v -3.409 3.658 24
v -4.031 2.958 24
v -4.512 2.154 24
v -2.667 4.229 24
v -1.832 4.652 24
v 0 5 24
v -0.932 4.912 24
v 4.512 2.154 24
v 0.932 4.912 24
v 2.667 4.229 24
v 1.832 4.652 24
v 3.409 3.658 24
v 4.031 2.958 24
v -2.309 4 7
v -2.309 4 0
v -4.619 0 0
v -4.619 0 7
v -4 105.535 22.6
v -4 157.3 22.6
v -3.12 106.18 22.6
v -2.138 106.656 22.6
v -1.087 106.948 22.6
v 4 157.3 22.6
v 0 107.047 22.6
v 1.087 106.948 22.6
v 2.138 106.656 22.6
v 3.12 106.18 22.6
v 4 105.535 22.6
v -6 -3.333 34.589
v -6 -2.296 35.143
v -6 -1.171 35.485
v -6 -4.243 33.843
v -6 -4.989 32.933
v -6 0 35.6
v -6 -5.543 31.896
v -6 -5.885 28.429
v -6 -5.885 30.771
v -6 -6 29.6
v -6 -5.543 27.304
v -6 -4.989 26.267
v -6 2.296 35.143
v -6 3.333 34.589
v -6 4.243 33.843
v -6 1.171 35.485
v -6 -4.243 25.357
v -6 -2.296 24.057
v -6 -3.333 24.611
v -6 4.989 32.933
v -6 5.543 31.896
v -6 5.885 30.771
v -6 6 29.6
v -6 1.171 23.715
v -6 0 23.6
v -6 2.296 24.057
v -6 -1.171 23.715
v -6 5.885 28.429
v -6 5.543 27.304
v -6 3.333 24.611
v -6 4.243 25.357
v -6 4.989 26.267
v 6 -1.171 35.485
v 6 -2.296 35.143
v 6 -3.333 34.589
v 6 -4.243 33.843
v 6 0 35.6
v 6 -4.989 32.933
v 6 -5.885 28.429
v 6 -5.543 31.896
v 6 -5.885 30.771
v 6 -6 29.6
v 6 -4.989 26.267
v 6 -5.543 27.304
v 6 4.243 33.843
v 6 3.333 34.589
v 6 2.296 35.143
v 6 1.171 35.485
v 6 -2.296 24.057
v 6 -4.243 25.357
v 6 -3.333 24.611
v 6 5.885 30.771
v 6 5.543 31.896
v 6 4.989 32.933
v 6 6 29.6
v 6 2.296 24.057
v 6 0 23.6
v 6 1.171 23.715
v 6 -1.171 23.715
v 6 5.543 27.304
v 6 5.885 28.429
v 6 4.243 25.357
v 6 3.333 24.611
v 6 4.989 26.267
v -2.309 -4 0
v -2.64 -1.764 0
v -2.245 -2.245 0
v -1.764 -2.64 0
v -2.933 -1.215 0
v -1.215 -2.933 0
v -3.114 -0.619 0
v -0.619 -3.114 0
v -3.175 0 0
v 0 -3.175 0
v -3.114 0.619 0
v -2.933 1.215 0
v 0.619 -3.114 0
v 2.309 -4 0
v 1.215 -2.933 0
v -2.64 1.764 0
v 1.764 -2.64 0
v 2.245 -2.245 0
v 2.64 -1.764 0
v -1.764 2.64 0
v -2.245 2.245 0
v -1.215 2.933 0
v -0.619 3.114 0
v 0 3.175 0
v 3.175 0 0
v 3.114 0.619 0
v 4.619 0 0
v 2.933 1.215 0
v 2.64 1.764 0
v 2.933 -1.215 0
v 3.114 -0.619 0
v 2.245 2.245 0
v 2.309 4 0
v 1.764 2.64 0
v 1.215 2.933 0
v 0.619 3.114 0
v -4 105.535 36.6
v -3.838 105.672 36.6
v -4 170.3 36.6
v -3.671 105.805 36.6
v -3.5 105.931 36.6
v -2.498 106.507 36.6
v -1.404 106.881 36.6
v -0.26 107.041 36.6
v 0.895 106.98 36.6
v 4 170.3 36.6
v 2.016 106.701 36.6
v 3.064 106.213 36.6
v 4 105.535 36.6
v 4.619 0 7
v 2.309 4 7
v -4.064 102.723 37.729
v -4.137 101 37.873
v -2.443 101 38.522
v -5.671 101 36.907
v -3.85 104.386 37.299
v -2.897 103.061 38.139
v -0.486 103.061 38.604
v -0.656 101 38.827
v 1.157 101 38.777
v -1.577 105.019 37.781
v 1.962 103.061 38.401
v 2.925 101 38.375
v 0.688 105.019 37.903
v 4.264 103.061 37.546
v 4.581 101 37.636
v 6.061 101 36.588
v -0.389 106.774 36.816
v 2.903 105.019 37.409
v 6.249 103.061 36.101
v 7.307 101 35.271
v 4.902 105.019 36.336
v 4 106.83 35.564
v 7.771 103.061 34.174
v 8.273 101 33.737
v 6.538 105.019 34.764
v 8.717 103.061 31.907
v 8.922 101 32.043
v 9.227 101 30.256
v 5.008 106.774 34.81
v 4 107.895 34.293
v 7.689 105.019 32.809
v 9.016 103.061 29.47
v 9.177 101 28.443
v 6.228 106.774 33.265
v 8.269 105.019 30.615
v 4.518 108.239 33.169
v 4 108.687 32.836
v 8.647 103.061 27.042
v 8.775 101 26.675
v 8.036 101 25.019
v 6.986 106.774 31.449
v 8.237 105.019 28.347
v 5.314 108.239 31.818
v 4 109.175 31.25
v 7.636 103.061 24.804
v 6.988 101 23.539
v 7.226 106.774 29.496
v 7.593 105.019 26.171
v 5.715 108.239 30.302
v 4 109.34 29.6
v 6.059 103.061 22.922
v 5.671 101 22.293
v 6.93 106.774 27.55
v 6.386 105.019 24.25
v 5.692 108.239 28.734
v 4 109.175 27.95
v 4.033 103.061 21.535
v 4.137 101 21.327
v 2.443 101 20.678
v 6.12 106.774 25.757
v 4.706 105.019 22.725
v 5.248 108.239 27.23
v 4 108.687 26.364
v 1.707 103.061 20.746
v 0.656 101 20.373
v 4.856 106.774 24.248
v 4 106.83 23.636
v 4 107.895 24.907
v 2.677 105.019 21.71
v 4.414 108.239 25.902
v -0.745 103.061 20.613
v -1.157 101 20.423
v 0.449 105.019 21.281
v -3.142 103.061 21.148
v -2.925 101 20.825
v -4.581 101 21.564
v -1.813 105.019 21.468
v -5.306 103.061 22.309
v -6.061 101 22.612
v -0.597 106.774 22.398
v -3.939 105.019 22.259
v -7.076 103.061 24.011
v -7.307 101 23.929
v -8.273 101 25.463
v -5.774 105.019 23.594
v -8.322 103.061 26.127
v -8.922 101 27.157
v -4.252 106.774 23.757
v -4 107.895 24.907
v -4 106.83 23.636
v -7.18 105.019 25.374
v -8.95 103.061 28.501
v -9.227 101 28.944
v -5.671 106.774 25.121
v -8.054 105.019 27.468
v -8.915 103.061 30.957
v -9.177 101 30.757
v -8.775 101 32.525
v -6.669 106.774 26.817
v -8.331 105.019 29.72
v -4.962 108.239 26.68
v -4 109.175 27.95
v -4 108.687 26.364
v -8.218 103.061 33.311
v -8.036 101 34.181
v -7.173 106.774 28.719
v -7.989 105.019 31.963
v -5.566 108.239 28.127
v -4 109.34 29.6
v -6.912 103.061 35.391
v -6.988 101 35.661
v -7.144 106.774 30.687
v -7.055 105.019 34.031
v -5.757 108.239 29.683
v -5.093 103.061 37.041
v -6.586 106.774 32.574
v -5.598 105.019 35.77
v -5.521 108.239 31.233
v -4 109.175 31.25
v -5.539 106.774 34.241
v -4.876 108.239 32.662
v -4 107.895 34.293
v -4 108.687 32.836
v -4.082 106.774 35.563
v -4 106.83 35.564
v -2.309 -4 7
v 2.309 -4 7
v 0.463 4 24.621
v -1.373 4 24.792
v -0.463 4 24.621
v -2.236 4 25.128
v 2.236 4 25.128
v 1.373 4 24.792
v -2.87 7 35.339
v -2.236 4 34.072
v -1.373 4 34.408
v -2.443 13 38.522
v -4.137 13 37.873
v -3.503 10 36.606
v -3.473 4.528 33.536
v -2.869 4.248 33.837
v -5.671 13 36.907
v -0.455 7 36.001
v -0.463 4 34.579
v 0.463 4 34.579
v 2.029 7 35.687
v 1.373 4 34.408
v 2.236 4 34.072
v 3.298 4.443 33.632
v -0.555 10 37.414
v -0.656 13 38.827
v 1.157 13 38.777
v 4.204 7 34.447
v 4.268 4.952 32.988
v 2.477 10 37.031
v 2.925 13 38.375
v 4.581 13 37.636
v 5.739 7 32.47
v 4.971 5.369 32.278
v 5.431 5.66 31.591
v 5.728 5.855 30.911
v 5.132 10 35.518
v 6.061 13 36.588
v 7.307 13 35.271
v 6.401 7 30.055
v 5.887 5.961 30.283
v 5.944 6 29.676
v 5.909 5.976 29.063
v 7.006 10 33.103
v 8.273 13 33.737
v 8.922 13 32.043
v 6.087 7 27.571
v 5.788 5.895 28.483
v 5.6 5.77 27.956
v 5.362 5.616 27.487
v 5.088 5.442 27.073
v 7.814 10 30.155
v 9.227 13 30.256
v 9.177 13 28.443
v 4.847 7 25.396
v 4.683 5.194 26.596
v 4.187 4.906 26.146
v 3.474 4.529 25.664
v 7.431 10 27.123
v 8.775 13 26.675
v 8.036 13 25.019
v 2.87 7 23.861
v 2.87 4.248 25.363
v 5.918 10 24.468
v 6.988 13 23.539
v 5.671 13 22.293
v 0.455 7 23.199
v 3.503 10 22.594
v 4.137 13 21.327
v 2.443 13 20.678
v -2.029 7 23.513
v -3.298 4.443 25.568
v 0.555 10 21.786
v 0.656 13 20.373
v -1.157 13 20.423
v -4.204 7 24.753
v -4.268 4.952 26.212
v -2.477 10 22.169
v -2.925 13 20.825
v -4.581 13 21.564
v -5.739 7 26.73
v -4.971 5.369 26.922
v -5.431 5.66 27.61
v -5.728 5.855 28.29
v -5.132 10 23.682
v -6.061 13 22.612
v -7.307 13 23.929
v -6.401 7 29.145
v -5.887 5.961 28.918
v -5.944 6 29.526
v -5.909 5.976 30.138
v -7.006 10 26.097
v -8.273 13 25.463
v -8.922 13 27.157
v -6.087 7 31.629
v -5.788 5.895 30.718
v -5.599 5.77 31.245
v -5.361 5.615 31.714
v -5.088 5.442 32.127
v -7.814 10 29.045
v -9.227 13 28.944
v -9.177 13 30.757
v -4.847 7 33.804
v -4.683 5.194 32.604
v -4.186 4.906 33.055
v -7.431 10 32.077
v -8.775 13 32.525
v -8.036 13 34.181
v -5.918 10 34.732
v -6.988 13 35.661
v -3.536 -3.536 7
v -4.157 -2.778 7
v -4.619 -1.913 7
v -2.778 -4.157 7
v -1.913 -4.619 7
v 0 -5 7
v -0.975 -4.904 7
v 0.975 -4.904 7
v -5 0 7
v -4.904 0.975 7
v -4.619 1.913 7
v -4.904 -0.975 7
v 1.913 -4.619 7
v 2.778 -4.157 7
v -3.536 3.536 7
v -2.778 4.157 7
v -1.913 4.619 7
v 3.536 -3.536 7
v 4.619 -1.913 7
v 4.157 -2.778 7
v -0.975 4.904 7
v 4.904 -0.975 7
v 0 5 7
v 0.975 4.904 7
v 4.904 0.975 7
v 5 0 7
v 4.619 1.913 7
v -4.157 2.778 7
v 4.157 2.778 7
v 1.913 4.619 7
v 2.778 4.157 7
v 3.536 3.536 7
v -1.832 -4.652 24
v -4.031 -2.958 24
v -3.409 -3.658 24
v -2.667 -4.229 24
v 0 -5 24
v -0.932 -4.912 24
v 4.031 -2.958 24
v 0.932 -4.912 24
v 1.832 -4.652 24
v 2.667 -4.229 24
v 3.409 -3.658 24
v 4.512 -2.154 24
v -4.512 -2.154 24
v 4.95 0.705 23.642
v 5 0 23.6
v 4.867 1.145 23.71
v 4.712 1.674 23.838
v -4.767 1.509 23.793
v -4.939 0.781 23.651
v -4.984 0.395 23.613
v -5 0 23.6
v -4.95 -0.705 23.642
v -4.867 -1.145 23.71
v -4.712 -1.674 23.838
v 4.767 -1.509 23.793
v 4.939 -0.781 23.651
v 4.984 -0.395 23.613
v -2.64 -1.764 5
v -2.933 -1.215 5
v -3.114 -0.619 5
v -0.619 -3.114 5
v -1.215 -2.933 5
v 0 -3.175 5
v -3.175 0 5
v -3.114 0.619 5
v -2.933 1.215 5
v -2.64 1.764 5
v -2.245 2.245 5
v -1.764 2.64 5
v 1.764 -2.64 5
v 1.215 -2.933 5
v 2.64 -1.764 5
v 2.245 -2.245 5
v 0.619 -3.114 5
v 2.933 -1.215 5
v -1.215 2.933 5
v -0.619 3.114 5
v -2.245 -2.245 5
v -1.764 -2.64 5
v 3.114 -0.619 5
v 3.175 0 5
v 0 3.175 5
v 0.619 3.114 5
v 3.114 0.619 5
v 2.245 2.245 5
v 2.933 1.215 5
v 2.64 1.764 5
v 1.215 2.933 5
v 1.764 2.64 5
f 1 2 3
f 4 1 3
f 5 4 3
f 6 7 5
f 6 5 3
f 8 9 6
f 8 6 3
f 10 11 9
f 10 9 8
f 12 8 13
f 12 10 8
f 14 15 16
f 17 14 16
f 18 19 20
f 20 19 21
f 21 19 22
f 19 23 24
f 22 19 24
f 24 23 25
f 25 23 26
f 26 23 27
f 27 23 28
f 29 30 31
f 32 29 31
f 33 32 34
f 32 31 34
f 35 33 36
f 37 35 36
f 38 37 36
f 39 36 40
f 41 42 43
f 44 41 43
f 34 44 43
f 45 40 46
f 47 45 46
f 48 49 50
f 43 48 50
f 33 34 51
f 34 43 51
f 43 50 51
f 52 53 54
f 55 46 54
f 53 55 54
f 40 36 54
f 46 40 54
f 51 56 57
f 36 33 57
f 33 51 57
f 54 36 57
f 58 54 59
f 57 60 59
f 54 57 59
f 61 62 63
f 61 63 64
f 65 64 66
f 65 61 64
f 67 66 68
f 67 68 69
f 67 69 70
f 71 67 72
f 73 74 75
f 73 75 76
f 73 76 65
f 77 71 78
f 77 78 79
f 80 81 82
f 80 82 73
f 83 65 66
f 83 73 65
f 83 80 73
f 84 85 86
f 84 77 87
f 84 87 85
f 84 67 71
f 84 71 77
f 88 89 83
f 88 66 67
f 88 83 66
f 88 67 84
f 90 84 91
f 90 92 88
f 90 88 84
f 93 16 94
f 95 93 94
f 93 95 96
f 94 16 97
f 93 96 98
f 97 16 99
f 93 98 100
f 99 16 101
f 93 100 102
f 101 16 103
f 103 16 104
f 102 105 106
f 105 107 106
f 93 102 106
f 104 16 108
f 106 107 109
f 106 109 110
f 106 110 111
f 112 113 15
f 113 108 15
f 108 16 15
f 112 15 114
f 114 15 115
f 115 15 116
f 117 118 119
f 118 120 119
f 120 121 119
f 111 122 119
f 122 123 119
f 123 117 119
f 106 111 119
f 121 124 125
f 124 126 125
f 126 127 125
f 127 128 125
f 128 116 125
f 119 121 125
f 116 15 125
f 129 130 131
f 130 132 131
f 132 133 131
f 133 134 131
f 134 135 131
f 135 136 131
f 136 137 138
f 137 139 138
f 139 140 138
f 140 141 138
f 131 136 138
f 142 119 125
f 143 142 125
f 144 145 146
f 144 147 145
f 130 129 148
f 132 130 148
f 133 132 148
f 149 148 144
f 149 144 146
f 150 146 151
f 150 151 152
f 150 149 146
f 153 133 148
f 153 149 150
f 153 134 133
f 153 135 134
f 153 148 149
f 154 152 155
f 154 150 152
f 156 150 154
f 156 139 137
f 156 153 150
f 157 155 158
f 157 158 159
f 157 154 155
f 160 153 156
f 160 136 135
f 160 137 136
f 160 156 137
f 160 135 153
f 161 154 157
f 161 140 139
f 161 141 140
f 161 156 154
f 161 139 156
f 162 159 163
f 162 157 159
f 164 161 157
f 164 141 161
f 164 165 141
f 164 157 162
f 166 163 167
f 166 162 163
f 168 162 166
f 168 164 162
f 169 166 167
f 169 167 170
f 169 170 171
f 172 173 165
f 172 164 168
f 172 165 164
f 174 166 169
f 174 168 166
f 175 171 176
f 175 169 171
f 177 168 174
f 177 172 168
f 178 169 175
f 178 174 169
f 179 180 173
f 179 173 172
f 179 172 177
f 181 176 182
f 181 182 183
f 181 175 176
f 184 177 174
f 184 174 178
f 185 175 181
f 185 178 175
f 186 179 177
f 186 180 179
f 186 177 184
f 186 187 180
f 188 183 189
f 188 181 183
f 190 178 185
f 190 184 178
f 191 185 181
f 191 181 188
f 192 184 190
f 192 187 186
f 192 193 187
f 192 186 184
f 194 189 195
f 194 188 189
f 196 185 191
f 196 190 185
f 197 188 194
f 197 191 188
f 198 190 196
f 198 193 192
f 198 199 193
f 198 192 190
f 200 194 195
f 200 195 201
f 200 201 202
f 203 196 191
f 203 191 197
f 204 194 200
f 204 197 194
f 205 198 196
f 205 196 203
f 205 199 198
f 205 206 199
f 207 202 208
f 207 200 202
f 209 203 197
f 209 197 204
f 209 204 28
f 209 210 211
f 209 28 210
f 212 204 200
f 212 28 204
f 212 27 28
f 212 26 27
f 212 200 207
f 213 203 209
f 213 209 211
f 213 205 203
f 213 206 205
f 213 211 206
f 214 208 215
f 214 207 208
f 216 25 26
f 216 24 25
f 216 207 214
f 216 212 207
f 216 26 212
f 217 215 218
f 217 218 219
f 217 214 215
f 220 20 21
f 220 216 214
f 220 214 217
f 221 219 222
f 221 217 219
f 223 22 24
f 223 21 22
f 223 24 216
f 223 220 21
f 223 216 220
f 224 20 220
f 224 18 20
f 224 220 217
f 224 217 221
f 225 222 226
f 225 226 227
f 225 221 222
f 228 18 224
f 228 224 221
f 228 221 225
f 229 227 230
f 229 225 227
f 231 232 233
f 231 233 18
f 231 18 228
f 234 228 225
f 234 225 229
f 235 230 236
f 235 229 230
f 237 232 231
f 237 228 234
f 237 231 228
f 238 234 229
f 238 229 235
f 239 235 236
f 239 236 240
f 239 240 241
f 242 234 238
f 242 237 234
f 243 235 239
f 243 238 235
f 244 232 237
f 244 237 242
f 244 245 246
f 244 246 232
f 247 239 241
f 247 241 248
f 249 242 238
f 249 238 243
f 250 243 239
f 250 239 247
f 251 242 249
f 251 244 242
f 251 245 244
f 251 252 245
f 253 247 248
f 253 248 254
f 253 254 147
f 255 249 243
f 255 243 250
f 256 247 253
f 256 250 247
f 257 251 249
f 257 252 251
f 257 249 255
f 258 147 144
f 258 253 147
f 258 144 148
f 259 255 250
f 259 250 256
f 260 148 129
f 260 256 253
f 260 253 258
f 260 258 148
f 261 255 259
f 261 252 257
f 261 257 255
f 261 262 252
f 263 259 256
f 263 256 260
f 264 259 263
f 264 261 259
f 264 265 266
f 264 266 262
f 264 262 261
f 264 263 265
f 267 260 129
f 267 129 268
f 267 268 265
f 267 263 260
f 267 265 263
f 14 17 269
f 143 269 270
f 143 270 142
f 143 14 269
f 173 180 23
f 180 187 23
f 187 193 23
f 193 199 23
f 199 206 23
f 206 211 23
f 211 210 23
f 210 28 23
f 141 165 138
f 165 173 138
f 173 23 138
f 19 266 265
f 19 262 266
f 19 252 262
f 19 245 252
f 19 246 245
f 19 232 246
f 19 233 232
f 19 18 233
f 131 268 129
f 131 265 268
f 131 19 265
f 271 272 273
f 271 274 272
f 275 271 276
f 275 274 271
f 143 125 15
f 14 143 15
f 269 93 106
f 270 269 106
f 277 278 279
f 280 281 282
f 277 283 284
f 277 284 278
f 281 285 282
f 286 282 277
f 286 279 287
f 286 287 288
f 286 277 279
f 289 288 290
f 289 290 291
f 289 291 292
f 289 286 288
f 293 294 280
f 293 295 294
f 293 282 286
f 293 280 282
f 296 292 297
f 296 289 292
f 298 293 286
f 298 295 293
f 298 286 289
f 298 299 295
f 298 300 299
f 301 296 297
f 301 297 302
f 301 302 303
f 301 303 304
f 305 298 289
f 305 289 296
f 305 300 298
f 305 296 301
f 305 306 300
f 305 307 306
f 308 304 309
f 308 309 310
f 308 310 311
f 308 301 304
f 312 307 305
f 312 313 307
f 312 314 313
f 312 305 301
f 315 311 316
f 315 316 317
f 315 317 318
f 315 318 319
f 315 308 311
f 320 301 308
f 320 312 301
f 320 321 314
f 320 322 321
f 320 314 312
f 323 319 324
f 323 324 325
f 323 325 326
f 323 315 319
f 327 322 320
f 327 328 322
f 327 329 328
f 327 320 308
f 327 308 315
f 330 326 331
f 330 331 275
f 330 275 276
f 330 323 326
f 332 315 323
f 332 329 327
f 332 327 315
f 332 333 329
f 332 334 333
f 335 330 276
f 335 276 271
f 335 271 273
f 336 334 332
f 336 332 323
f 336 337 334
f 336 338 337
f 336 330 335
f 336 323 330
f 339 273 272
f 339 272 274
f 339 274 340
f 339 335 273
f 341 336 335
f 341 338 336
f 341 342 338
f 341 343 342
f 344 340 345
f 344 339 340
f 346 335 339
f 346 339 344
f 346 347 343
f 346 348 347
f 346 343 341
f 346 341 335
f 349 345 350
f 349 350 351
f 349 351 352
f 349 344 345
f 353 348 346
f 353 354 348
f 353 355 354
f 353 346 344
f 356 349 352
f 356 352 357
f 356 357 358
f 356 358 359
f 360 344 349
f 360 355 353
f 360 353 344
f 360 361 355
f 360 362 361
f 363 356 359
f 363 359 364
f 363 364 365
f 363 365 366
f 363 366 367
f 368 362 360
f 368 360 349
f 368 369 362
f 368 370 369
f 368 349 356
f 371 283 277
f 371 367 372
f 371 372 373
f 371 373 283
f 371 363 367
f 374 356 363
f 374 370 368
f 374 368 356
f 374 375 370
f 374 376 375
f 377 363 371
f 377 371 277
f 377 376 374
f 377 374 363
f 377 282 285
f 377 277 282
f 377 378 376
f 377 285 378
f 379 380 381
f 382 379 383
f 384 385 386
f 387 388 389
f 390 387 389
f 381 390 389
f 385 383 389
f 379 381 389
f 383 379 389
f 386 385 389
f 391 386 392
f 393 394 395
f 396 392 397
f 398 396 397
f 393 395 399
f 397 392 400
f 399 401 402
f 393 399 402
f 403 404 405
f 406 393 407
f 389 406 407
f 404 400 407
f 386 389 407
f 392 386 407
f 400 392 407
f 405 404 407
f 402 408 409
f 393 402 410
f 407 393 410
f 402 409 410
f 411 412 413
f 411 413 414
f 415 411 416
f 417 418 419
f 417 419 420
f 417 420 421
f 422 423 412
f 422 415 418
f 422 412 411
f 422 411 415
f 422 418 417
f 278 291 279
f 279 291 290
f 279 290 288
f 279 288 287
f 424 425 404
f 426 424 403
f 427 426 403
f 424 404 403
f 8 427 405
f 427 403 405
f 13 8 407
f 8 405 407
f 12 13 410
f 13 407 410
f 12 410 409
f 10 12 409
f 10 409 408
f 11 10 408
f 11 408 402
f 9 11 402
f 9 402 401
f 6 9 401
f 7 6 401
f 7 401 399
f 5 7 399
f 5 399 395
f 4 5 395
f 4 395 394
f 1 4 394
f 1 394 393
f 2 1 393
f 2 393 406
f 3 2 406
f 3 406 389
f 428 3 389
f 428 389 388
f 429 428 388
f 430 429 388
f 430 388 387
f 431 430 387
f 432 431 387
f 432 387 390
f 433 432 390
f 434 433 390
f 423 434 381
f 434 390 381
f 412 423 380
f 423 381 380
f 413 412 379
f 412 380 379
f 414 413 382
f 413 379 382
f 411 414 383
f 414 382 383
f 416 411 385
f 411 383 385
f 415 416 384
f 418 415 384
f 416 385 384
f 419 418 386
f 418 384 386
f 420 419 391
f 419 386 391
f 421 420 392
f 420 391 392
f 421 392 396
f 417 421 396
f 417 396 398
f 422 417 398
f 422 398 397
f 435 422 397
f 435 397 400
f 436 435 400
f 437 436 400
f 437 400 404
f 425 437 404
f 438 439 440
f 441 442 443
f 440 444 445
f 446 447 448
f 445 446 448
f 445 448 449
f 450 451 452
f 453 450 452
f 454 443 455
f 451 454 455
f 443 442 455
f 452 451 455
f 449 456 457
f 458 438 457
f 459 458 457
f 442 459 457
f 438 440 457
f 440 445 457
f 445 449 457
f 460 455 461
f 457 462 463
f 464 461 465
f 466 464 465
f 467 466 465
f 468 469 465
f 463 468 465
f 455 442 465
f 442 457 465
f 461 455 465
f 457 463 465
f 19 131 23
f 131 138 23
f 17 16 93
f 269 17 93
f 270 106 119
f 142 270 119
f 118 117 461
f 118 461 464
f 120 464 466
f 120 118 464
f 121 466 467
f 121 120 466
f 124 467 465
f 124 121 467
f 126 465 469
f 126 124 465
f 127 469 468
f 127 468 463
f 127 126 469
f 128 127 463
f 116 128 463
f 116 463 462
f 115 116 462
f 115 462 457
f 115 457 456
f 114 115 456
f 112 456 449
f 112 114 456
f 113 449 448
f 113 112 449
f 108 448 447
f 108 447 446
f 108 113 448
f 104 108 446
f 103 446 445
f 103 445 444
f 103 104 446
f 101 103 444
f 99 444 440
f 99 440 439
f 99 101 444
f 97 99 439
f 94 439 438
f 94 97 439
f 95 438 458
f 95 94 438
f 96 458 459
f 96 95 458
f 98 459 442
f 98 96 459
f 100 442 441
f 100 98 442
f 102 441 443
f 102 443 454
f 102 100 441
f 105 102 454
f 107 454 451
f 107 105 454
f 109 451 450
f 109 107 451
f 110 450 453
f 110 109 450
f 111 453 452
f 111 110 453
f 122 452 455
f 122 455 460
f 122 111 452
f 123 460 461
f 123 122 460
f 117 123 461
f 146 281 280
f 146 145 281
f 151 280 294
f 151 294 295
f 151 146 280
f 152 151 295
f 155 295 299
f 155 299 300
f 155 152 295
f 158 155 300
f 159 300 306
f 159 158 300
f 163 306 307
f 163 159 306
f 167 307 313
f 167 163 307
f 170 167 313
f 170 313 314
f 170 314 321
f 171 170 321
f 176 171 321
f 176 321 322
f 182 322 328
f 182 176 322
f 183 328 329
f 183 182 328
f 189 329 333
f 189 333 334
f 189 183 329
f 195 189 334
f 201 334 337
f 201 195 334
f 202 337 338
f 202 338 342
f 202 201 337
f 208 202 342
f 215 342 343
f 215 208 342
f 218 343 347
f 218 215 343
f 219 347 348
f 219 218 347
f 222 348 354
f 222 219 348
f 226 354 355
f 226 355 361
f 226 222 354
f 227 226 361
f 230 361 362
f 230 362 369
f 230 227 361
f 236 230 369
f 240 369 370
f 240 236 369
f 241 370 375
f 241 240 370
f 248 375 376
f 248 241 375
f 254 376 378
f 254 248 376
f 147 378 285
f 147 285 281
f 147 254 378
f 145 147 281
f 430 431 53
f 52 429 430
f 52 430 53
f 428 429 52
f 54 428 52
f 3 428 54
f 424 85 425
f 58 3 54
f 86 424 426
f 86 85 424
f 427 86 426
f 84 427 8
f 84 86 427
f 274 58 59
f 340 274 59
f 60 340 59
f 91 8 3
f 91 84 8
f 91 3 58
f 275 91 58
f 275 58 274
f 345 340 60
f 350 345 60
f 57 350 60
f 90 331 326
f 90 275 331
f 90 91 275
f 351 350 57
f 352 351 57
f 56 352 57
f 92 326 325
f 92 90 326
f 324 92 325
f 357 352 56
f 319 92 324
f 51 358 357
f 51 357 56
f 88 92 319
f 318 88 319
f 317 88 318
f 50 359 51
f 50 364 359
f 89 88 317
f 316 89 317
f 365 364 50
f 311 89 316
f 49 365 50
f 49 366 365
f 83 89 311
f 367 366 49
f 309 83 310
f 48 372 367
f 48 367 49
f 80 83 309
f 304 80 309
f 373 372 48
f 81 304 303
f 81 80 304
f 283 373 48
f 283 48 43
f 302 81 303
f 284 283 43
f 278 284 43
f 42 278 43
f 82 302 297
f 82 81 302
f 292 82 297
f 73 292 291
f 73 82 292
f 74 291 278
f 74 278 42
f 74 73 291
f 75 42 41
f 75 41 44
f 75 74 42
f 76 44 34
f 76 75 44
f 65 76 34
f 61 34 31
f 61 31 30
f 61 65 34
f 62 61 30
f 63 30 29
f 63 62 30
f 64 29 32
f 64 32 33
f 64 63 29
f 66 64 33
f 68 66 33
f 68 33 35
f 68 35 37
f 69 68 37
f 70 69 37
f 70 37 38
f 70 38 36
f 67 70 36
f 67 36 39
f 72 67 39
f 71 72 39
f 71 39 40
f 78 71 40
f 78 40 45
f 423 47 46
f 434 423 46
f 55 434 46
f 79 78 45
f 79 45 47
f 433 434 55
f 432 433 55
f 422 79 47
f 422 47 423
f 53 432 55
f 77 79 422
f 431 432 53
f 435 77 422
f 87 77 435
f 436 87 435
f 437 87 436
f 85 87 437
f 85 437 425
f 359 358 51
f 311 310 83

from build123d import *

# Parameters (mm, degrees)
SMA_NUT_DEPTH        = 7
SKETCH2_R            = 3.175
SMA_BORE_DEPTH       = 5
SKETCH3_R            = 5
SLEEVE_DEPTH         = 17
SKETCH4_R            = 6
SWIVEL_KNUCKLE_DEPTH = 6
WHIP_BLADE_DEPTH     = 4


with BuildPart() as part:
    # Sketch1 → SMA_Nut (new body)
    with BuildSketch(Plane.XY):
        Polygon((4.618802154, 0), (2.309401077, 4), (-2.309401077, 4), (-4.618802154, 0), (-2.309401077, -4), (2.309401077, -4), align=None)
    extrude(amount=SMA_NUT_DEPTH)

    # Sketch2 → SMA_Bore (cut)
    with BuildSketch(Plane.XY):
        Circle(SKETCH2_R)
    extrude(amount=SMA_BORE_DEPTH, mode=Mode.SUBTRACT)


with BuildPart() as body_2:
    # Sketch3 → Sleeve (new body)
    with BuildSketch(Plane.XY.offset(7)):
        Circle(SKETCH3_R)
    extrude(amount=SLEEVE_DEPTH)

    # Sketch4 → Swivel_Knuckle (add, symmetric)
    with BuildSketch(Plane(origin=(0, 0, 0), x_dir=(0, 0, -1), z_dir=(1, 0, 0))):
        with Locations((-29.6, 0)):
            Circle(SKETCH4_R)
    extrude(amount=SWIVEL_KNUCKLE_DEPTH, both=True)

    # Sketch5 → Radome_Boot (revolve)
    with BuildSketch(Plane(origin=(0, 0, 0), x_dir=(0, 0, -1), z_dir=(1, 0, 0)), mode=Mode.PRIVATE) as radome_boot_sk:
        with BuildLine():
            Line((-29.6, 4), (-34.6, 4))
            Line((-34.6, 4), (-38.85, 13))
            Line((-38.85, 13), (-38.85, 101))
            ThreePointArc((-38.85, 101), (-36.140737726, 107.540737726), (-29.6, 110.25))
            Line((-29.6, 110.25), (-29.6, 4))
        make_face()
    revolve(radome_boot_sk.sketch.rotate(Axis((0, 2, 29.6), (0, 1, 0)), 333.434949116), axis=Axis((0, 2, 29.6), (0, 1, 0)))

    # Sketch6 → Whip_Blade (add, symmetric)
    with BuildSketch(Plane(origin=(0, 0, 0), x_dir=(0, 0, -1), z_dir=(1, 0, 0))):
        Polygon((-22.6, 95), (-36.6, 95), (-36.6, 170.3), (-22.6, 157.3), align=None)
    extrude(amount=WHIP_BLADE_DEPTH, both=True)


solid = Compound([part.part, body_2.part])
